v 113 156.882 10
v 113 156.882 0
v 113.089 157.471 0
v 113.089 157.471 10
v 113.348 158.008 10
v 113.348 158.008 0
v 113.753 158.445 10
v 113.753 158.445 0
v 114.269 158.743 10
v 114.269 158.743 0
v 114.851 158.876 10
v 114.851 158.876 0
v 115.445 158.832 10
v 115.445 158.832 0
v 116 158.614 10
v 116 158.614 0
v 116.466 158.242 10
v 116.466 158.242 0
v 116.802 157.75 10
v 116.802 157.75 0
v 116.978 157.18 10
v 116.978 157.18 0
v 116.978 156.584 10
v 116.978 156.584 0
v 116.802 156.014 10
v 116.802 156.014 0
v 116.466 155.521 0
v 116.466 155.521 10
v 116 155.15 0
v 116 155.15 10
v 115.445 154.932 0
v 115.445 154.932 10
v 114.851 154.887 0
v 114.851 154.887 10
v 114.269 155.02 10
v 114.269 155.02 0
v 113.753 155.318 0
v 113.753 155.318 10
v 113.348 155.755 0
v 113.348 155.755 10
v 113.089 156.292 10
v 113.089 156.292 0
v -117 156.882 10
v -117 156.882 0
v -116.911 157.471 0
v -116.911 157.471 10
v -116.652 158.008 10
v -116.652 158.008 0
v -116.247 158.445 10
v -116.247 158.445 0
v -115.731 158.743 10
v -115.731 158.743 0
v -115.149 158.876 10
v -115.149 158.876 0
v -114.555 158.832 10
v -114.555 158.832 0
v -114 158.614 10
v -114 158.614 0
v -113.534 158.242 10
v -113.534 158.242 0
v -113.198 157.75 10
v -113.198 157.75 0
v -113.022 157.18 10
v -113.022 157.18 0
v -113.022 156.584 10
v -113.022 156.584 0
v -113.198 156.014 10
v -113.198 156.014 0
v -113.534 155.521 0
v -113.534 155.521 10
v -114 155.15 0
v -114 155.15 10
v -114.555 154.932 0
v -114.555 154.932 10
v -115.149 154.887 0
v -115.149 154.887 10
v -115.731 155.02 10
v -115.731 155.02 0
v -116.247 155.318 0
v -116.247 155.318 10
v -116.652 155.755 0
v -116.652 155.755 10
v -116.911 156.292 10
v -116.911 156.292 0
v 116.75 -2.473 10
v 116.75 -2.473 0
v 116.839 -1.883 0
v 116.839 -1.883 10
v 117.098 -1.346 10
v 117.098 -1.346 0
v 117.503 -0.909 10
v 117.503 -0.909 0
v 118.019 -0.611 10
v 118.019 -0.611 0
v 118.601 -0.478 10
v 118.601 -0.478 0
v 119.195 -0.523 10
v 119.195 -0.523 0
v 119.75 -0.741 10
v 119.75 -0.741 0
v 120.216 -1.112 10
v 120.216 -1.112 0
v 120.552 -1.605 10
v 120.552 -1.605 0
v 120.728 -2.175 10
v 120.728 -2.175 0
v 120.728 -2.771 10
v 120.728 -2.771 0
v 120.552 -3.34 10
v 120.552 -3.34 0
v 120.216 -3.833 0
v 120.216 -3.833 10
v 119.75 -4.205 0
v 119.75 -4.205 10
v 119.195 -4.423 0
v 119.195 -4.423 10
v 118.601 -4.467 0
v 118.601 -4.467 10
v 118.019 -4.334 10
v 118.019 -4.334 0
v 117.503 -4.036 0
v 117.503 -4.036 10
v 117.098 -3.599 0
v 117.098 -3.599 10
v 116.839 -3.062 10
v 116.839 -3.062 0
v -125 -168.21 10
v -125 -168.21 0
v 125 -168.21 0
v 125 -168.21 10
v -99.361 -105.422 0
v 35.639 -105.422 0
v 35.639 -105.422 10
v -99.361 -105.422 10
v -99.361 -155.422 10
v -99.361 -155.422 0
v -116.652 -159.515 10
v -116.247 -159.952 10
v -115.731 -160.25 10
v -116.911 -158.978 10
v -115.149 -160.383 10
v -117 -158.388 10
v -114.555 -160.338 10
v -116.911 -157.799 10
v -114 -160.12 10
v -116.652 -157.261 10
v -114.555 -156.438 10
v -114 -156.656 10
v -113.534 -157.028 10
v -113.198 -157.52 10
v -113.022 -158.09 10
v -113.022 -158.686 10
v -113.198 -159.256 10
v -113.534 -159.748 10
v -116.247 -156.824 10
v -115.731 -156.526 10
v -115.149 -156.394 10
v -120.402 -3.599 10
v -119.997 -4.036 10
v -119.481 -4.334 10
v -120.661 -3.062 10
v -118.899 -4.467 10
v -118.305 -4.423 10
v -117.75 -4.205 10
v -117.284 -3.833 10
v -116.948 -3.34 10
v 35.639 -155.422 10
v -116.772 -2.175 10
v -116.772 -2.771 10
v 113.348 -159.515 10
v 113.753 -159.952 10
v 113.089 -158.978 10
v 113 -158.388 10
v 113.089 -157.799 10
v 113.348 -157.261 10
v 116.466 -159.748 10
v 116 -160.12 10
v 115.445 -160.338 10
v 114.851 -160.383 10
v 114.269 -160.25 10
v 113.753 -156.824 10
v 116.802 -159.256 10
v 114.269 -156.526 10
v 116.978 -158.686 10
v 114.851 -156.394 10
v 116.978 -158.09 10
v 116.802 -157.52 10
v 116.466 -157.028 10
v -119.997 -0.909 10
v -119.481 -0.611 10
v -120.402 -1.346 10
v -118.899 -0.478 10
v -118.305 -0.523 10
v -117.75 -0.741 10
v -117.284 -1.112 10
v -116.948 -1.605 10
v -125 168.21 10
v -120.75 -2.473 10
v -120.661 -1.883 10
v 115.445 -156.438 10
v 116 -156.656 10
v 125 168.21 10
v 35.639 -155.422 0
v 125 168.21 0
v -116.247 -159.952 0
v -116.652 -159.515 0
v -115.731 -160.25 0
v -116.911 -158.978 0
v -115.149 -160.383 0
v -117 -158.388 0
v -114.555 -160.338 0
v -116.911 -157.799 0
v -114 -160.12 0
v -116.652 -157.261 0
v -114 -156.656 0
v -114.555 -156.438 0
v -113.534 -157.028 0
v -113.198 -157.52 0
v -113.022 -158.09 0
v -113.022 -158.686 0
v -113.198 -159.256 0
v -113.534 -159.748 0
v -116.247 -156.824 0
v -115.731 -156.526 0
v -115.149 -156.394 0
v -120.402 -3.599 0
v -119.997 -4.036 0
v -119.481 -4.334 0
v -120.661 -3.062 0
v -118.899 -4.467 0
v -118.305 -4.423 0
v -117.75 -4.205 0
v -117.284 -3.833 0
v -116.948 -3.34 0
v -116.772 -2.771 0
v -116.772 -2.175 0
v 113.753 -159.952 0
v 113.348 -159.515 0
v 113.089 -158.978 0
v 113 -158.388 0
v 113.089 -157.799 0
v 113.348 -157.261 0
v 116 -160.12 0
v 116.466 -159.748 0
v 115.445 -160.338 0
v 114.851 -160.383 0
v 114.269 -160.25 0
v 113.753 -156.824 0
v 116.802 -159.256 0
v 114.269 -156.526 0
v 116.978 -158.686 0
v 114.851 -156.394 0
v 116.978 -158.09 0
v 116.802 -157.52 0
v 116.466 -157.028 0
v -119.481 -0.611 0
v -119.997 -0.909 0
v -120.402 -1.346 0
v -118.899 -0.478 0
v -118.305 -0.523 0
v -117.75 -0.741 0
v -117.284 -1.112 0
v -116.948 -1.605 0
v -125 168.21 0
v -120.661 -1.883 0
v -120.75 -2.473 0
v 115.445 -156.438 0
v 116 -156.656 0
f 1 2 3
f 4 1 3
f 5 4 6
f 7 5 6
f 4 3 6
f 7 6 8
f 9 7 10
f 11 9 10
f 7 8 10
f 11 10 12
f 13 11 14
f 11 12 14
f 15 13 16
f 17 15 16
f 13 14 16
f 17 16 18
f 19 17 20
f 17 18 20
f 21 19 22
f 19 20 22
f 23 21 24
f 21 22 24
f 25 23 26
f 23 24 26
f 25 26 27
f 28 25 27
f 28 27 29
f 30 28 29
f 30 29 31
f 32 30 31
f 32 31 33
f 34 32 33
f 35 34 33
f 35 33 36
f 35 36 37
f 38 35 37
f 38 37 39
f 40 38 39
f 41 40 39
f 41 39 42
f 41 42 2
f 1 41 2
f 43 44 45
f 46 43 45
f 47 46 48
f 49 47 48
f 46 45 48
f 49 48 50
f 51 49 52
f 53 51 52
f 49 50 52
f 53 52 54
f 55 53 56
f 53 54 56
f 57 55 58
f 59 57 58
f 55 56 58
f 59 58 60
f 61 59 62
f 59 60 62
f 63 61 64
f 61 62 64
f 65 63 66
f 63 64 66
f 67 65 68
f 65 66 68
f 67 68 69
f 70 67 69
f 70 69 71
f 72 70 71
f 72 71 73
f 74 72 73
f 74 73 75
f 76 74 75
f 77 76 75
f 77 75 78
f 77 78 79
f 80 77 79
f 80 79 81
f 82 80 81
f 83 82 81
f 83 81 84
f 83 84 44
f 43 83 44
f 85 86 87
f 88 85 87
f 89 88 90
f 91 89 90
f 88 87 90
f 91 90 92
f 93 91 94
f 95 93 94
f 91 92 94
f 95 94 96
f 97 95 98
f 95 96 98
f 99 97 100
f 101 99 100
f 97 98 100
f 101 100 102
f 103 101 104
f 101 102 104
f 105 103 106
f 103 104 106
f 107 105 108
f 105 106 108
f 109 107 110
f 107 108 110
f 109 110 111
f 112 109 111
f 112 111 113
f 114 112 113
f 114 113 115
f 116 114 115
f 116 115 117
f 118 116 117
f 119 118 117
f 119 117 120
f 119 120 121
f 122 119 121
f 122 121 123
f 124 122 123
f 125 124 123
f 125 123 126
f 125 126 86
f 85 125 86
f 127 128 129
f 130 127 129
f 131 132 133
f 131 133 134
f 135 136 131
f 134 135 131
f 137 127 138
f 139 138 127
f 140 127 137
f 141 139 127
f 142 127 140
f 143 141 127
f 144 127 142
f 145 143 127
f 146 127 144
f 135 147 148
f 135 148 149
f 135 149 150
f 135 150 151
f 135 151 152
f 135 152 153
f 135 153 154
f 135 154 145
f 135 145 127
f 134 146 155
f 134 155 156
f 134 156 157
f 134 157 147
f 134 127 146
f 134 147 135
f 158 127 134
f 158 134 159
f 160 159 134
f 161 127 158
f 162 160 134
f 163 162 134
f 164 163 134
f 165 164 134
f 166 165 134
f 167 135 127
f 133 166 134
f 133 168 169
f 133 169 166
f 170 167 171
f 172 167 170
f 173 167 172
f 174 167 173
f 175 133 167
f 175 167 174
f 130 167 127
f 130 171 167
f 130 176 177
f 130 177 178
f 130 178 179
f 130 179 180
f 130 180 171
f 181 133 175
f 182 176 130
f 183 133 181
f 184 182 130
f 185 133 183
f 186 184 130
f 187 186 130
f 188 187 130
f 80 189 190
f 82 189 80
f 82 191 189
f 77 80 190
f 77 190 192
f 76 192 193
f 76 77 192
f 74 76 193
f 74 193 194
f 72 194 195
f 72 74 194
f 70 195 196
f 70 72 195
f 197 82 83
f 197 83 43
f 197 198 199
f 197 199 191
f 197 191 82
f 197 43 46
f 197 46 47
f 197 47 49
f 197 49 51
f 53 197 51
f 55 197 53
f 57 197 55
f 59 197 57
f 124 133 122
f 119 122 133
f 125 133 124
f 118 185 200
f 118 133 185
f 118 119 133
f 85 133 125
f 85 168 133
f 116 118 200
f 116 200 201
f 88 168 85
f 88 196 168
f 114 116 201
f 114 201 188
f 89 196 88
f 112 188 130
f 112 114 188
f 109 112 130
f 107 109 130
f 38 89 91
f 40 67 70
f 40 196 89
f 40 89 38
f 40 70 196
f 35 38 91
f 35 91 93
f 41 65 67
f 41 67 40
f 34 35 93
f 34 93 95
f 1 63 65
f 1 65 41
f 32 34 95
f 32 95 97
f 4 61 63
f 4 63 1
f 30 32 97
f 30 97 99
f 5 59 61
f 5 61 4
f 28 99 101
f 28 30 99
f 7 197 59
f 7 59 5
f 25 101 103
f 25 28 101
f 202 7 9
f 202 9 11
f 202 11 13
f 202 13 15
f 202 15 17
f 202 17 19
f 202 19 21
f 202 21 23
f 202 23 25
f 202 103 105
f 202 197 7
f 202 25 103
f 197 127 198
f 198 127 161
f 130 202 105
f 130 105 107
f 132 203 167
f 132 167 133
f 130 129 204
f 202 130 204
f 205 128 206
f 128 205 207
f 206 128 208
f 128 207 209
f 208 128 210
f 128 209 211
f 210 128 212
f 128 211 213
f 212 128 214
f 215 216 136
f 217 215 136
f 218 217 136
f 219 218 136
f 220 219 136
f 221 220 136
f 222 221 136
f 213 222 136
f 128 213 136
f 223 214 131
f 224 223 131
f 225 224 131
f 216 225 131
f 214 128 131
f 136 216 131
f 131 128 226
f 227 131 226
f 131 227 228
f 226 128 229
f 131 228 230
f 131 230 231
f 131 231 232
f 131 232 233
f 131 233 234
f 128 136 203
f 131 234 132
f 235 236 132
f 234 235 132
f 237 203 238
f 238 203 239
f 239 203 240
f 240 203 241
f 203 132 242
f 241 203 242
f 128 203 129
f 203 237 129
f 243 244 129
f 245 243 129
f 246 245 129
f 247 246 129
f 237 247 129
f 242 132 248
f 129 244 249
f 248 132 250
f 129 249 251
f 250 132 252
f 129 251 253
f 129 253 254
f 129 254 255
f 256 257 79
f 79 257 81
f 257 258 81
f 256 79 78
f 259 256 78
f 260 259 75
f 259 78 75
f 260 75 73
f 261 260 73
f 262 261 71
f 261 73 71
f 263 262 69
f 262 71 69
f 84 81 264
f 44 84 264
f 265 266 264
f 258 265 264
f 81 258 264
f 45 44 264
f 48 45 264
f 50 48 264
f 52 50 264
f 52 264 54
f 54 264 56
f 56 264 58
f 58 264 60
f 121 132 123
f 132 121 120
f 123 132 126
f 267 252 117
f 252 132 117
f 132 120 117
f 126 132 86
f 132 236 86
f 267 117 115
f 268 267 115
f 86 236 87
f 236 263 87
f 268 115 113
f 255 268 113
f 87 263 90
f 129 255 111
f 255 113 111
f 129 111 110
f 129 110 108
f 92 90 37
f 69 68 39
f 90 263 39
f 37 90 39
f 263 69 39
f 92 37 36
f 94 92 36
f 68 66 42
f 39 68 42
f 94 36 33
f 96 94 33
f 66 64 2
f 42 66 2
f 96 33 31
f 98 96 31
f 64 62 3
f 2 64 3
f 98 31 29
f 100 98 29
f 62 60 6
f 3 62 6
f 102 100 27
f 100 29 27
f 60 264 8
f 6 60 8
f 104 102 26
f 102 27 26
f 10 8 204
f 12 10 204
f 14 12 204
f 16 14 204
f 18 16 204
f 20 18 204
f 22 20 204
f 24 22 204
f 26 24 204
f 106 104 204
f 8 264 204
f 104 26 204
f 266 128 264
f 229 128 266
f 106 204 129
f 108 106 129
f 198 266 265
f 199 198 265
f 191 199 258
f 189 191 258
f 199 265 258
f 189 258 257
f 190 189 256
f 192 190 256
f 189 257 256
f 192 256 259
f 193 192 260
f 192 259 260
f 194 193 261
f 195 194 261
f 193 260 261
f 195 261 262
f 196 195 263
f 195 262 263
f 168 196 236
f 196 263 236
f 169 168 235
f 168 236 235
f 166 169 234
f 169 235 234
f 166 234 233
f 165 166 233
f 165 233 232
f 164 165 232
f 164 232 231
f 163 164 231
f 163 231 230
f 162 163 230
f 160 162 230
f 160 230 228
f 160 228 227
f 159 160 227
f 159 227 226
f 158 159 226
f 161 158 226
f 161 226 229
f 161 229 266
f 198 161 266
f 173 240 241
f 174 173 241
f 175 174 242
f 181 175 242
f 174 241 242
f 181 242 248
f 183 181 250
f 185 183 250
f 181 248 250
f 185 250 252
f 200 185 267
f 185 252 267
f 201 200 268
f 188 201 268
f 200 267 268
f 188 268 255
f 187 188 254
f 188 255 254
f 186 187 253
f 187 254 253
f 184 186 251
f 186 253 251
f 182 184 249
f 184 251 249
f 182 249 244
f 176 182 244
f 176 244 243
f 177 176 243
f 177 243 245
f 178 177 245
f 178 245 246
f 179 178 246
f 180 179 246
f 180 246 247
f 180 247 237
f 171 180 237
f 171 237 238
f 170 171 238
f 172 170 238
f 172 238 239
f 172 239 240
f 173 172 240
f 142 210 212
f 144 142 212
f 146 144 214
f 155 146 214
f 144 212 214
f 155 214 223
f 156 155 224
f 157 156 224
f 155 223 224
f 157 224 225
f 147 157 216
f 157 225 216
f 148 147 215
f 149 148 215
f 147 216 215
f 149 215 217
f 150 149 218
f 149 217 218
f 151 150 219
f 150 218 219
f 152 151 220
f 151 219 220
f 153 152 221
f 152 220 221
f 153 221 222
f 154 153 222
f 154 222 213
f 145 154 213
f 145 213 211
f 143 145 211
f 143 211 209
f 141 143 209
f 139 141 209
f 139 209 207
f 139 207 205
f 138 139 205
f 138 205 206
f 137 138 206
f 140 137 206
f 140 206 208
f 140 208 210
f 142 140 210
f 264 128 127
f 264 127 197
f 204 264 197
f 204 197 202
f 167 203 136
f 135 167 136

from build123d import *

# Parameters (mm, degrees)
CROQUIS1_W              = 250
CROQUIS1_H              = 336.42
SALIENTE_EXTRUIR1_DEPTH = 10
CORTAR_EXTRUIR1_REACH   = 12
CROQUIS2_R              = 2
CORTAR_EXTRUIR2_REACH   = 12
CROQUIS3_W              = 135
CROQUIS3_H              = 50


with BuildPart() as part:
    # Croquis1 → Saliente-Extruir1 (new body)
    with BuildSketch(Plane.XY):
        Rectangle(CROQUIS1_W, CROQUIS1_H)
    extrude(amount=SALIENTE_EXTRUIR1_DEPTH)

    # Croquis2 → Cortar-Extruir1 (cut, up to next)
    with BuildSketch(Plane(origin=(0, 0, 0), x_dir=(-1, 0, 0), z_dir=(0, 0, -1)), mode=Mode.PRIVATE) as cortar_extruir1_sk1:
        with Locations((115, 156.881750805)):
            Circle(CROQUIS2_R)
    cortar_extruir1_tool1 = extrude(cortar_extruir1_sk1.sketch, amount=-CORTAR_EXTRUIR1_REACH, mode=Mode.PRIVATE) & part.part
    add(cortar_extruir1_tool1.solids().sort_by_distance((-115, 156.881751, 0))[0], mode=Mode.SUBTRACT)
    # Croquis2 → Cortar-Extruir1 (cut, up to next)
    with BuildSketch(Plane(origin=(0, 0, 0), x_dir=(-1, 0, 0), z_dir=(0, 0, -1)), mode=Mode.PRIVATE) as cortar_extruir1_sk2:
        with Locations((-115, 156.881750805)):
            Circle(CROQUIS2_R)
    cortar_extruir1_tool2 = extrude(cortar_extruir1_sk2.sketch, amount=-CORTAR_EXTRUIR1_REACH, mode=Mode.PRIVATE) & part.part
    add(cortar_extruir1_tool2.solids().sort_by_distance((115, 156.881751, 0))[0], mode=Mode.SUBTRACT)
    # Croquis2 → Cortar-Extruir1 (cut, up to next)
    with BuildSketch(Plane(origin=(0, 0, 0), x_dir=(-1, 0, 0), z_dir=(0, 0, -1)), mode=Mode.PRIVATE) as cortar_extruir1_sk3:
        with Locations((-118.75, -2.472724195)):
            Circle(CROQUIS2_R)
    cortar_extruir1_tool3 = extrude(cortar_extruir1_sk3.sketch, amount=-CORTAR_EXTRUIR1_REACH, mode=Mode.PRIVATE) & part.part
    add(cortar_extruir1_tool3.solids().sort_by_distance((118.75, -2.472724, 0))[0], mode=Mode.SUBTRACT)
    # Croquis2 → Cortar-Extruir1 (cut, up to next)
    with BuildSketch(Plane(origin=(0, 0, 0), x_dir=(-1, 0, 0), z_dir=(0, 0, -1)), mode=Mode.PRIVATE) as cortar_extruir1_sk4:
        with Locations((118.75, -2.472724195)):
            Circle(CROQUIS2_R)
    cortar_extruir1_tool4 = extrude(cortar_extruir1_sk4.sketch, amount=-CORTAR_EXTRUIR1_REACH, mode=Mode.PRIVATE) & part.part
    add(cortar_extruir1_tool4.solids().sort_by_distance((-118.75, -2.472724, 0))[0], mode=Mode.SUBTRACT)
    # Croquis2 → Cortar-Extruir1 (cut, up to next)
    with BuildSketch(Plane(origin=(0, 0, 0), x_dir=(-1, 0, 0), z_dir=(0, 0, -1)), mode=Mode.PRIVATE) as cortar_extruir1_sk5:
        with Locations((-115, -158.388099131)):
            Circle(CROQUIS2_R)
    cortar_extruir1_tool5 = extrude(cortar_extruir1_sk5.sketch, amount=-CORTAR_EXTRUIR1_REACH, mode=Mode.PRIVATE) & part.part
    add(cortar_extruir1_tool5.solids().sort_by_distance((115, -158.388099, 0))[0], mode=Mode.SUBTRACT)
    # Croquis2 → Cortar-Extruir1 (cut, up to next)
    with BuildSketch(Plane(origin=(0, 0, 0), x_dir=(-1, 0, 0), z_dir=(0, 0, -1)), mode=Mode.PRIVATE) as cortar_extruir1_sk6:
        with Locations((115, -158.388099131)):
            Circle(CROQUIS2_R)
    cortar_extruir1_tool6 = extrude(cortar_extruir1_sk6.sketch, amount=-CORTAR_EXTRUIR1_REACH, mode=Mode.PRIVATE) & part.part
    add(cortar_extruir1_tool6.solids().sort_by_distance((-115, -158.388099, 0))[0], mode=Mode.SUBTRACT)

    # Croquis3 → Cortar-Extruir2 (cut, up to next)
    with BuildSketch(Plane(origin=(0, 0, 0), x_dir=(-1, 0, 0), z_dir=(0, 0, -1)), mode=Mode.PRIVATE) as cortar_extruir2_sk1:
        with Locations((31.860667122, -130.421960957)):
            Rectangle(CROQUIS3_W, CROQUIS3_H)
    cortar_extruir2_tool1 = extrude(cortar_extruir2_sk1.sketch, amount=-CORTAR_EXTRUIR2_REACH, mode=Mode.PRIVATE) & part.part
    add(cortar_extruir2_tool1.solids().sort_by_distance((-31.860667, -130.421961, 0))[0], mode=Mode.SUBTRACT)


solid = part.part
